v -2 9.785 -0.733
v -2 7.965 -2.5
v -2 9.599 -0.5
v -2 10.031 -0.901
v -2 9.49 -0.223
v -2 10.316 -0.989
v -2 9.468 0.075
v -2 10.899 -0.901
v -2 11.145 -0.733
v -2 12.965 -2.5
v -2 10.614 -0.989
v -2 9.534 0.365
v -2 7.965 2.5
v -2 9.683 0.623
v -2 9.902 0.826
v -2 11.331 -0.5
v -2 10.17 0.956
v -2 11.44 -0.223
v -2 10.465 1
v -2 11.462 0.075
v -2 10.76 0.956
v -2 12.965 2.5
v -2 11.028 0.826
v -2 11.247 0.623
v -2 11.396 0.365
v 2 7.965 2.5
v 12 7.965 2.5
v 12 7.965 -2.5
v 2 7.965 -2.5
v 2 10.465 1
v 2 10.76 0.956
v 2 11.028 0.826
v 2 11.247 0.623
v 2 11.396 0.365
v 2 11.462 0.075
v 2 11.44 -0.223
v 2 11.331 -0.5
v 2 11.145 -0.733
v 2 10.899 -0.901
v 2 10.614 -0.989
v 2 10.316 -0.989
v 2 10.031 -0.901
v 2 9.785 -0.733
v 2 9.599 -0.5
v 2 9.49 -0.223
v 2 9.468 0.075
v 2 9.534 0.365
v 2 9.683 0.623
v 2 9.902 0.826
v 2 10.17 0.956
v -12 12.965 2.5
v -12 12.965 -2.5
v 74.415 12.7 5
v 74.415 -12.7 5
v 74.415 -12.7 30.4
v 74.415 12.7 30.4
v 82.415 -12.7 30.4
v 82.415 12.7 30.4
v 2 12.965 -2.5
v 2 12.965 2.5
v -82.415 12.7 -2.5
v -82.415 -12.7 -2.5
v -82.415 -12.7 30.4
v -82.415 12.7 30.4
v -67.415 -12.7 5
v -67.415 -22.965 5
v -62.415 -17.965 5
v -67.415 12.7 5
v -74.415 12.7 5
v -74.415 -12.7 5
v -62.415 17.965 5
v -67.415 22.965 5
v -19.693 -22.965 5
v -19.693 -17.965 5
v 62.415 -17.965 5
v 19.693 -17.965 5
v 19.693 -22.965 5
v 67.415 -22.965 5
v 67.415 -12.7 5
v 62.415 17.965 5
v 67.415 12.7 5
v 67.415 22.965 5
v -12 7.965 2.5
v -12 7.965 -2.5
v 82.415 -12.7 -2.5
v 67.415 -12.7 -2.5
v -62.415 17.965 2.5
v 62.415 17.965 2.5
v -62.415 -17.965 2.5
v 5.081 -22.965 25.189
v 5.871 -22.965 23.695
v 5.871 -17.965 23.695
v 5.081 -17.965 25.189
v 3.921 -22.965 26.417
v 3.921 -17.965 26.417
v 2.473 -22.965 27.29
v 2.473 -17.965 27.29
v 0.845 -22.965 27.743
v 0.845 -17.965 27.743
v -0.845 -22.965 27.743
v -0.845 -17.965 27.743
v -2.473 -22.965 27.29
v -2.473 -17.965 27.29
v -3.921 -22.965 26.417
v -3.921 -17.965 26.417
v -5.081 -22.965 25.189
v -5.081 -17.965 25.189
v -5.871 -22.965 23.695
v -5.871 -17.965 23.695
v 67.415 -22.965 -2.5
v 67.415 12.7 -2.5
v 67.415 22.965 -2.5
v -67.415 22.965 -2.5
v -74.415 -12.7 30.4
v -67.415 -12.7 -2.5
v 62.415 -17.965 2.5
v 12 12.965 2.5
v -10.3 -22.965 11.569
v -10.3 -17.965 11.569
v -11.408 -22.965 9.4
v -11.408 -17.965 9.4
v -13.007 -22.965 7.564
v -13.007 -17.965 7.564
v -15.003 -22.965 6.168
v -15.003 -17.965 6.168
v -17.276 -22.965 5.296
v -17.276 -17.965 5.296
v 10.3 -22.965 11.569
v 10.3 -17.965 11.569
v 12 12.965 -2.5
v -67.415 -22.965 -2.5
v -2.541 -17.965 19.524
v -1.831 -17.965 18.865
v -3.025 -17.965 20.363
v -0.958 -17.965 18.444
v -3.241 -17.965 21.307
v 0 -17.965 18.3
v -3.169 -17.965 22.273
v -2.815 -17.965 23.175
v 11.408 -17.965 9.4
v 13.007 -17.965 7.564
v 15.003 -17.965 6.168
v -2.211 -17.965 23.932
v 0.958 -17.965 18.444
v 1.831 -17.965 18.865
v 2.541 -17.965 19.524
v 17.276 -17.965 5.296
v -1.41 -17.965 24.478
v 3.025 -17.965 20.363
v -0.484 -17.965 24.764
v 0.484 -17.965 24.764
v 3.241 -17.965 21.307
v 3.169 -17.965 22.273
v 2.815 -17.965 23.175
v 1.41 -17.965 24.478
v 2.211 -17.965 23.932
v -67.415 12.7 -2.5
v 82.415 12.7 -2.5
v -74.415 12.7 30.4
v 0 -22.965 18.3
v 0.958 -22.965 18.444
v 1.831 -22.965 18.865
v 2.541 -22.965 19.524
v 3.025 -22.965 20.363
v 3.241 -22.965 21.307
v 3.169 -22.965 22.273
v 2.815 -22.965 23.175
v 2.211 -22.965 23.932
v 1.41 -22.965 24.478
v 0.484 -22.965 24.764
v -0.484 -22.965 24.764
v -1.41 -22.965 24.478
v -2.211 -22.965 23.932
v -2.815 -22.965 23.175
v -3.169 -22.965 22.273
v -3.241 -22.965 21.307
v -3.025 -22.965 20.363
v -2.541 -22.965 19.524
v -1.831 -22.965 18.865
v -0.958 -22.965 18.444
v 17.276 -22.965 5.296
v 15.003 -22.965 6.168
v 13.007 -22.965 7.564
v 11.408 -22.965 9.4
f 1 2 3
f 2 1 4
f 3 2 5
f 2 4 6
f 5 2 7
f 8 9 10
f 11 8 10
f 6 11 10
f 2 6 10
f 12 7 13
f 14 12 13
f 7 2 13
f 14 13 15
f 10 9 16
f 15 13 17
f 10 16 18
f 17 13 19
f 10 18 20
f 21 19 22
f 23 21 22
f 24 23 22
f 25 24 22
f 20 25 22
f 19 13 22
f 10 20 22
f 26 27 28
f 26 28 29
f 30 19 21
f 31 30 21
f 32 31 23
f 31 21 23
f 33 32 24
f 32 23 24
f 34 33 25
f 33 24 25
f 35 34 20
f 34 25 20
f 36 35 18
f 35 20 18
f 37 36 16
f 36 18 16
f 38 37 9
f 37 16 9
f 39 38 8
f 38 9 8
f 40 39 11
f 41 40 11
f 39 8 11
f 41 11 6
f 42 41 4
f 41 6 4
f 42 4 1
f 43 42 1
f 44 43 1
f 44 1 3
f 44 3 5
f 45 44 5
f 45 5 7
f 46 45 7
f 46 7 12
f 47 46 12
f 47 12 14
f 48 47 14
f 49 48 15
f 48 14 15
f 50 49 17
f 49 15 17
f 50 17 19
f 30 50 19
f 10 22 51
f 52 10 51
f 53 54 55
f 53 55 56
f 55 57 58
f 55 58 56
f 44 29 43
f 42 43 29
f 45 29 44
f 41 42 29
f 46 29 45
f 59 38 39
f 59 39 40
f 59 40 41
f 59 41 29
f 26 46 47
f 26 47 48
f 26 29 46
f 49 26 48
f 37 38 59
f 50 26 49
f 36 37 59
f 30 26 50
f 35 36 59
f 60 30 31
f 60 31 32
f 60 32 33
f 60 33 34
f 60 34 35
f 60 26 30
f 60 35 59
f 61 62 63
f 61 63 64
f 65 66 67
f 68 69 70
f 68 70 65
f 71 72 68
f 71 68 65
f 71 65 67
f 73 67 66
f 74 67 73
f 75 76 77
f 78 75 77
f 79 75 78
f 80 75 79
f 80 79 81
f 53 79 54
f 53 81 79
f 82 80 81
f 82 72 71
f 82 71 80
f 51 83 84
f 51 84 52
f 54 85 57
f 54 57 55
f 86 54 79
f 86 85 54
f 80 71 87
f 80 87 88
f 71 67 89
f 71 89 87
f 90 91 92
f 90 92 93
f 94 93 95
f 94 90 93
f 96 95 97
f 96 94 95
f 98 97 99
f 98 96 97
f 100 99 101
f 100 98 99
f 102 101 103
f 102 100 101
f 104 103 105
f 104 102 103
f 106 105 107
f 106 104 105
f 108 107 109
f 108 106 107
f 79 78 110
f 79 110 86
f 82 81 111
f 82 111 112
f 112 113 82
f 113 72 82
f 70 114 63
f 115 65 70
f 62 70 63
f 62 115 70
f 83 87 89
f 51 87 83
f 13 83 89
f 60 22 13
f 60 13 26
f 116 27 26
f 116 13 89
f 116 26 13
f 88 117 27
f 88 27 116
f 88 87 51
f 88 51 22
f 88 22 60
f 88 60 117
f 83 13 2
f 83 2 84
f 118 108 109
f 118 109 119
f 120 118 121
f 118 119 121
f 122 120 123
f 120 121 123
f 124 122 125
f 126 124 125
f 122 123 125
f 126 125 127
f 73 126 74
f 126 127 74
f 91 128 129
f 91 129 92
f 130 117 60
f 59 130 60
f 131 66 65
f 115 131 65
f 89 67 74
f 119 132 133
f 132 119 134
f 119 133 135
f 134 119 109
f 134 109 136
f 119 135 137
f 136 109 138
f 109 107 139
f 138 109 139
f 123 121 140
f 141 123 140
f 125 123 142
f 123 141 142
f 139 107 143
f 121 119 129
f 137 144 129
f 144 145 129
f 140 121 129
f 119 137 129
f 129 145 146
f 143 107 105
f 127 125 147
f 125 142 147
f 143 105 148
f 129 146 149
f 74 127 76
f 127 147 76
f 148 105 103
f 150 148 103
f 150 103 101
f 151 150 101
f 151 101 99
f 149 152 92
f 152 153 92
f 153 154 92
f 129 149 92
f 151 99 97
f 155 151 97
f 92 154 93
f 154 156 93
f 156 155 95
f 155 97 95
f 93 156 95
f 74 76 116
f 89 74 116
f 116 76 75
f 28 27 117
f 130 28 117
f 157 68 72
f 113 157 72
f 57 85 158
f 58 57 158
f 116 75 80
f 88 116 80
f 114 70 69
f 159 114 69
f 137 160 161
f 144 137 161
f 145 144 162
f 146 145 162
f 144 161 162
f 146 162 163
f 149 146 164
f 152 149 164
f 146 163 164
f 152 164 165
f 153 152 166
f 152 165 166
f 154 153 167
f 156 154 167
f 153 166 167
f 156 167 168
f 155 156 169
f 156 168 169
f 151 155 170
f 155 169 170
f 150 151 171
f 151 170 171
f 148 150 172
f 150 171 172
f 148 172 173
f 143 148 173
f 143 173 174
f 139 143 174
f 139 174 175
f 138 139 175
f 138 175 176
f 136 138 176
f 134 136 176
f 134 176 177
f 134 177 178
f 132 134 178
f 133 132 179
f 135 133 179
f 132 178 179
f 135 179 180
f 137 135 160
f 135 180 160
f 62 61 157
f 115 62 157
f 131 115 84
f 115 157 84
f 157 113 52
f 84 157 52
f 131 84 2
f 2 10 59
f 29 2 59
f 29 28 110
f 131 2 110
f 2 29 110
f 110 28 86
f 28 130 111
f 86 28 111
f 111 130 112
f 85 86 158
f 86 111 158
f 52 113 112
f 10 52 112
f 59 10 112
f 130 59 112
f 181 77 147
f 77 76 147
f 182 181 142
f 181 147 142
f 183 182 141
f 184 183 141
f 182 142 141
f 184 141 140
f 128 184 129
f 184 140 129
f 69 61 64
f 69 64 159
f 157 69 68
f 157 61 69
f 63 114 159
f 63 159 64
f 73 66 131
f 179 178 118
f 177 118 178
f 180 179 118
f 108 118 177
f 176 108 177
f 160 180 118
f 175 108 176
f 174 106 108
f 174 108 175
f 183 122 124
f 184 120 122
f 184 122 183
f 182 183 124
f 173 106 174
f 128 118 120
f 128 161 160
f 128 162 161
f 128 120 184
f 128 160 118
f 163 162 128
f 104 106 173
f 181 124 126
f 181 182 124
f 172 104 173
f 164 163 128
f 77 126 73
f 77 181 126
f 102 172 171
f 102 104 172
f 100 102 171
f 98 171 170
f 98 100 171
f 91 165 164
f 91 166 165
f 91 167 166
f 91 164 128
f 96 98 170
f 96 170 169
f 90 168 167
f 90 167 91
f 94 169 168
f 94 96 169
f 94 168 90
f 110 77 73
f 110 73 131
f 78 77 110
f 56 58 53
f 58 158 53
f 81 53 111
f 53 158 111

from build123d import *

# Parameters (mm, degrees)
SKETCH1_W               = 134.83
SKETCH1_H               = 45.93
SKETCH1_W_2             = 124.83
SKETCH1_H_2             = 35.93
BOSS_EXTRUDE1_DEPTH     = 2.5
BOSS_EXTRUDE2_START     = 2.5
SKETCH1_3_W             = 134.83
SKETCH1_3_H             = 45.93
SKETCH1_3_W_2           = 124.83
SKETCH1_3_H_2           = 35.93
BOSS_EXTRUDE2_DEPTH     = 2.5
SKETCH2_R               = 6.25
SKETCH2_R_2             = 3.25
BOSS_EXTRUDE3_DEPTH     = 5
FILLET1_R               = 10
CUT_EXTRUDE4_DEPTH      = 78.396792246
CUT_EXTRUDE4_DEPTH_BACK = 78.396792246
SKETCH5_W               = 10
SKETCH5_H               = 5
SKETCH6_R               = 1
CUT_EXTRUDE5_DEPTH      = 4
SKETCH7_W               = 7
SKETCH7_H               = 25.4
SKETCH7_W_2             = 8
BOSS_EXTRUDE4_DEPTH     = 7.5
BOSS_EXTRUDE5_START     = -7.5
SKETCH7_4_W             = 8
SKETCH7_4_H             = 25.4
BOSS_EXTRUDE5_DEPTH     = 25.4


with BuildPart() as part:
    # Sketch1 → Boss-Extrude1 (new, symmetric)
    # profile 1 of 2: a face of its own
    with BuildSketch(Plane.XY):
        Rectangle(SKETCH1_W, SKETCH1_H)
        Rectangle(SKETCH1_W_2, SKETCH1_H_2, mode=Mode.SUBTRACT)
    # profile 2 of 2: a face of its own
    with BuildSketch(Plane.XY):
        Rectangle(SKETCH1_W_2, SKETCH1_H_2)
    extrude(amount=BOSS_EXTRUDE1_DEPTH, both=True)

    # Sketch1<3> → Boss-Extrude2 (add, symmetric)
    with BuildSketch(Plane.XY.offset(BOSS_EXTRUDE2_START)):
        Rectangle(SKETCH1_3_W, SKETCH1_3_H)
        Rectangle(SKETCH1_3_W_2, SKETCH1_3_H_2, mode=Mode.SUBTRACT)
    extrude(amount=BOSS_EXTRUDE2_DEPTH, both=True)

    # Sketch2 → Boss-Extrude3 (add)
    # profile 1 of 2: a face of its own
    with BuildSketch(Plane.XZ.offset(22.965)):
        with BuildLine():
            ThreePointArc((6.25, 21.55), (-1.088960505, 15.395597915), (-5.870532806, 23.694608256))
            Line((-5.870532806, 23.694608256), (-12.7, 5))
            Line((-12.7, 5), (12.7, 5))
            Line((12.7, 5), (5.870532806, 23.694608256))
            ThreePointArc((5.870532806, 23.694608256), (6.154402085, 22.638960505), (6.25, 21.55))
        make_face()
    # profile 2 of 2: a face of its own
    with BuildSketch(Plane.XZ.offset(22.965)):
        with Locations((0, 21.55)):
            Circle(SKETCH2_R)
        with Locations(Location((0, 21.55, 0), (0, 0, 270))):
            Circle(SKETCH2_R_2, mode=Mode.SUBTRACT)
    extrude(amount=-BOSS_EXTRUDE3_DEPTH)

    # Fillet1
    fillet1_edges = [part.edges().sort_by_distance(p)[0] for p in [
        (-12.7, -20.465, 5),
        (12.7, -20.465, 5),
    ]]
    fillet(fillet1_edges, radius=FILLET1_R)

    # Sketch5 → Cut-Extrude4 (cut, two sides: drawn at the far end of the back side and taken through both)
    with BuildSketch(Plane(origin=(0, 0, -2.5), x_dir=(-1, 0, 0), z_dir=(0, 0, -1)).offset(-CUT_EXTRUDE4_DEPTH_BACK)):
        with Locations((7, 10.465)):
            Rectangle(SKETCH5_W, SKETCH5_H)
        with Locations((-7, 10.465)):
            Rectangle(SKETCH5_W, SKETCH5_H)
    extrude(amount=CUT_EXTRUDE4_DEPTH + CUT_EXTRUDE4_DEPTH_BACK, mode=Mode.SUBTRACT)

    # Sketch6 → Cut-Extrude5 (cut)
    with BuildSketch(Plane.ZY.offset(2)):
        with Locations((0, 10.465)):
            Circle(SKETCH6_R)
    extrude(amount=-CUT_EXTRUDE5_DEPTH, mode=Mode.SUBTRACT)

    # Sketch7 → Boss-Extrude4 (add)
    with BuildSketch(Plane(origin=(0, 0, -2.5), x_dir=(-1, 0, 0), z_dir=(0, 0, -1))):
        with Locations((-70.915, 0)):
            Rectangle(SKETCH7_W, SKETCH7_H)
        with Locations((-78.415, 0)):
            Rectangle(SKETCH7_W_2, SKETCH7_H)
        with Locations((78.415, 0)):
            Rectangle(SKETCH7_W_2, SKETCH7_H)
        with Locations((70.915, 0)):
            Rectangle(SKETCH7_W, SKETCH7_H)
    extrude(amount=-BOSS_EXTRUDE4_DEPTH)

    # Sketch7<4> → Boss-Extrude5 (add)
    with BuildSketch(Plane(origin=(0, 0, -2.5), x_dir=(-1, 0, 0), z_dir=(0, 0, -1)).offset(BOSS_EXTRUDE5_START)):
        with Locations((-78.415, 0)):
            Rectangle(SKETCH7_4_W, SKETCH7_4_H)
        with Locations((78.415, 0)):
            Rectangle(SKETCH7_4_W, SKETCH7_4_H)
    extrude(amount=-BOSS_EXTRUDE5_DEPTH)


solid = part.part
